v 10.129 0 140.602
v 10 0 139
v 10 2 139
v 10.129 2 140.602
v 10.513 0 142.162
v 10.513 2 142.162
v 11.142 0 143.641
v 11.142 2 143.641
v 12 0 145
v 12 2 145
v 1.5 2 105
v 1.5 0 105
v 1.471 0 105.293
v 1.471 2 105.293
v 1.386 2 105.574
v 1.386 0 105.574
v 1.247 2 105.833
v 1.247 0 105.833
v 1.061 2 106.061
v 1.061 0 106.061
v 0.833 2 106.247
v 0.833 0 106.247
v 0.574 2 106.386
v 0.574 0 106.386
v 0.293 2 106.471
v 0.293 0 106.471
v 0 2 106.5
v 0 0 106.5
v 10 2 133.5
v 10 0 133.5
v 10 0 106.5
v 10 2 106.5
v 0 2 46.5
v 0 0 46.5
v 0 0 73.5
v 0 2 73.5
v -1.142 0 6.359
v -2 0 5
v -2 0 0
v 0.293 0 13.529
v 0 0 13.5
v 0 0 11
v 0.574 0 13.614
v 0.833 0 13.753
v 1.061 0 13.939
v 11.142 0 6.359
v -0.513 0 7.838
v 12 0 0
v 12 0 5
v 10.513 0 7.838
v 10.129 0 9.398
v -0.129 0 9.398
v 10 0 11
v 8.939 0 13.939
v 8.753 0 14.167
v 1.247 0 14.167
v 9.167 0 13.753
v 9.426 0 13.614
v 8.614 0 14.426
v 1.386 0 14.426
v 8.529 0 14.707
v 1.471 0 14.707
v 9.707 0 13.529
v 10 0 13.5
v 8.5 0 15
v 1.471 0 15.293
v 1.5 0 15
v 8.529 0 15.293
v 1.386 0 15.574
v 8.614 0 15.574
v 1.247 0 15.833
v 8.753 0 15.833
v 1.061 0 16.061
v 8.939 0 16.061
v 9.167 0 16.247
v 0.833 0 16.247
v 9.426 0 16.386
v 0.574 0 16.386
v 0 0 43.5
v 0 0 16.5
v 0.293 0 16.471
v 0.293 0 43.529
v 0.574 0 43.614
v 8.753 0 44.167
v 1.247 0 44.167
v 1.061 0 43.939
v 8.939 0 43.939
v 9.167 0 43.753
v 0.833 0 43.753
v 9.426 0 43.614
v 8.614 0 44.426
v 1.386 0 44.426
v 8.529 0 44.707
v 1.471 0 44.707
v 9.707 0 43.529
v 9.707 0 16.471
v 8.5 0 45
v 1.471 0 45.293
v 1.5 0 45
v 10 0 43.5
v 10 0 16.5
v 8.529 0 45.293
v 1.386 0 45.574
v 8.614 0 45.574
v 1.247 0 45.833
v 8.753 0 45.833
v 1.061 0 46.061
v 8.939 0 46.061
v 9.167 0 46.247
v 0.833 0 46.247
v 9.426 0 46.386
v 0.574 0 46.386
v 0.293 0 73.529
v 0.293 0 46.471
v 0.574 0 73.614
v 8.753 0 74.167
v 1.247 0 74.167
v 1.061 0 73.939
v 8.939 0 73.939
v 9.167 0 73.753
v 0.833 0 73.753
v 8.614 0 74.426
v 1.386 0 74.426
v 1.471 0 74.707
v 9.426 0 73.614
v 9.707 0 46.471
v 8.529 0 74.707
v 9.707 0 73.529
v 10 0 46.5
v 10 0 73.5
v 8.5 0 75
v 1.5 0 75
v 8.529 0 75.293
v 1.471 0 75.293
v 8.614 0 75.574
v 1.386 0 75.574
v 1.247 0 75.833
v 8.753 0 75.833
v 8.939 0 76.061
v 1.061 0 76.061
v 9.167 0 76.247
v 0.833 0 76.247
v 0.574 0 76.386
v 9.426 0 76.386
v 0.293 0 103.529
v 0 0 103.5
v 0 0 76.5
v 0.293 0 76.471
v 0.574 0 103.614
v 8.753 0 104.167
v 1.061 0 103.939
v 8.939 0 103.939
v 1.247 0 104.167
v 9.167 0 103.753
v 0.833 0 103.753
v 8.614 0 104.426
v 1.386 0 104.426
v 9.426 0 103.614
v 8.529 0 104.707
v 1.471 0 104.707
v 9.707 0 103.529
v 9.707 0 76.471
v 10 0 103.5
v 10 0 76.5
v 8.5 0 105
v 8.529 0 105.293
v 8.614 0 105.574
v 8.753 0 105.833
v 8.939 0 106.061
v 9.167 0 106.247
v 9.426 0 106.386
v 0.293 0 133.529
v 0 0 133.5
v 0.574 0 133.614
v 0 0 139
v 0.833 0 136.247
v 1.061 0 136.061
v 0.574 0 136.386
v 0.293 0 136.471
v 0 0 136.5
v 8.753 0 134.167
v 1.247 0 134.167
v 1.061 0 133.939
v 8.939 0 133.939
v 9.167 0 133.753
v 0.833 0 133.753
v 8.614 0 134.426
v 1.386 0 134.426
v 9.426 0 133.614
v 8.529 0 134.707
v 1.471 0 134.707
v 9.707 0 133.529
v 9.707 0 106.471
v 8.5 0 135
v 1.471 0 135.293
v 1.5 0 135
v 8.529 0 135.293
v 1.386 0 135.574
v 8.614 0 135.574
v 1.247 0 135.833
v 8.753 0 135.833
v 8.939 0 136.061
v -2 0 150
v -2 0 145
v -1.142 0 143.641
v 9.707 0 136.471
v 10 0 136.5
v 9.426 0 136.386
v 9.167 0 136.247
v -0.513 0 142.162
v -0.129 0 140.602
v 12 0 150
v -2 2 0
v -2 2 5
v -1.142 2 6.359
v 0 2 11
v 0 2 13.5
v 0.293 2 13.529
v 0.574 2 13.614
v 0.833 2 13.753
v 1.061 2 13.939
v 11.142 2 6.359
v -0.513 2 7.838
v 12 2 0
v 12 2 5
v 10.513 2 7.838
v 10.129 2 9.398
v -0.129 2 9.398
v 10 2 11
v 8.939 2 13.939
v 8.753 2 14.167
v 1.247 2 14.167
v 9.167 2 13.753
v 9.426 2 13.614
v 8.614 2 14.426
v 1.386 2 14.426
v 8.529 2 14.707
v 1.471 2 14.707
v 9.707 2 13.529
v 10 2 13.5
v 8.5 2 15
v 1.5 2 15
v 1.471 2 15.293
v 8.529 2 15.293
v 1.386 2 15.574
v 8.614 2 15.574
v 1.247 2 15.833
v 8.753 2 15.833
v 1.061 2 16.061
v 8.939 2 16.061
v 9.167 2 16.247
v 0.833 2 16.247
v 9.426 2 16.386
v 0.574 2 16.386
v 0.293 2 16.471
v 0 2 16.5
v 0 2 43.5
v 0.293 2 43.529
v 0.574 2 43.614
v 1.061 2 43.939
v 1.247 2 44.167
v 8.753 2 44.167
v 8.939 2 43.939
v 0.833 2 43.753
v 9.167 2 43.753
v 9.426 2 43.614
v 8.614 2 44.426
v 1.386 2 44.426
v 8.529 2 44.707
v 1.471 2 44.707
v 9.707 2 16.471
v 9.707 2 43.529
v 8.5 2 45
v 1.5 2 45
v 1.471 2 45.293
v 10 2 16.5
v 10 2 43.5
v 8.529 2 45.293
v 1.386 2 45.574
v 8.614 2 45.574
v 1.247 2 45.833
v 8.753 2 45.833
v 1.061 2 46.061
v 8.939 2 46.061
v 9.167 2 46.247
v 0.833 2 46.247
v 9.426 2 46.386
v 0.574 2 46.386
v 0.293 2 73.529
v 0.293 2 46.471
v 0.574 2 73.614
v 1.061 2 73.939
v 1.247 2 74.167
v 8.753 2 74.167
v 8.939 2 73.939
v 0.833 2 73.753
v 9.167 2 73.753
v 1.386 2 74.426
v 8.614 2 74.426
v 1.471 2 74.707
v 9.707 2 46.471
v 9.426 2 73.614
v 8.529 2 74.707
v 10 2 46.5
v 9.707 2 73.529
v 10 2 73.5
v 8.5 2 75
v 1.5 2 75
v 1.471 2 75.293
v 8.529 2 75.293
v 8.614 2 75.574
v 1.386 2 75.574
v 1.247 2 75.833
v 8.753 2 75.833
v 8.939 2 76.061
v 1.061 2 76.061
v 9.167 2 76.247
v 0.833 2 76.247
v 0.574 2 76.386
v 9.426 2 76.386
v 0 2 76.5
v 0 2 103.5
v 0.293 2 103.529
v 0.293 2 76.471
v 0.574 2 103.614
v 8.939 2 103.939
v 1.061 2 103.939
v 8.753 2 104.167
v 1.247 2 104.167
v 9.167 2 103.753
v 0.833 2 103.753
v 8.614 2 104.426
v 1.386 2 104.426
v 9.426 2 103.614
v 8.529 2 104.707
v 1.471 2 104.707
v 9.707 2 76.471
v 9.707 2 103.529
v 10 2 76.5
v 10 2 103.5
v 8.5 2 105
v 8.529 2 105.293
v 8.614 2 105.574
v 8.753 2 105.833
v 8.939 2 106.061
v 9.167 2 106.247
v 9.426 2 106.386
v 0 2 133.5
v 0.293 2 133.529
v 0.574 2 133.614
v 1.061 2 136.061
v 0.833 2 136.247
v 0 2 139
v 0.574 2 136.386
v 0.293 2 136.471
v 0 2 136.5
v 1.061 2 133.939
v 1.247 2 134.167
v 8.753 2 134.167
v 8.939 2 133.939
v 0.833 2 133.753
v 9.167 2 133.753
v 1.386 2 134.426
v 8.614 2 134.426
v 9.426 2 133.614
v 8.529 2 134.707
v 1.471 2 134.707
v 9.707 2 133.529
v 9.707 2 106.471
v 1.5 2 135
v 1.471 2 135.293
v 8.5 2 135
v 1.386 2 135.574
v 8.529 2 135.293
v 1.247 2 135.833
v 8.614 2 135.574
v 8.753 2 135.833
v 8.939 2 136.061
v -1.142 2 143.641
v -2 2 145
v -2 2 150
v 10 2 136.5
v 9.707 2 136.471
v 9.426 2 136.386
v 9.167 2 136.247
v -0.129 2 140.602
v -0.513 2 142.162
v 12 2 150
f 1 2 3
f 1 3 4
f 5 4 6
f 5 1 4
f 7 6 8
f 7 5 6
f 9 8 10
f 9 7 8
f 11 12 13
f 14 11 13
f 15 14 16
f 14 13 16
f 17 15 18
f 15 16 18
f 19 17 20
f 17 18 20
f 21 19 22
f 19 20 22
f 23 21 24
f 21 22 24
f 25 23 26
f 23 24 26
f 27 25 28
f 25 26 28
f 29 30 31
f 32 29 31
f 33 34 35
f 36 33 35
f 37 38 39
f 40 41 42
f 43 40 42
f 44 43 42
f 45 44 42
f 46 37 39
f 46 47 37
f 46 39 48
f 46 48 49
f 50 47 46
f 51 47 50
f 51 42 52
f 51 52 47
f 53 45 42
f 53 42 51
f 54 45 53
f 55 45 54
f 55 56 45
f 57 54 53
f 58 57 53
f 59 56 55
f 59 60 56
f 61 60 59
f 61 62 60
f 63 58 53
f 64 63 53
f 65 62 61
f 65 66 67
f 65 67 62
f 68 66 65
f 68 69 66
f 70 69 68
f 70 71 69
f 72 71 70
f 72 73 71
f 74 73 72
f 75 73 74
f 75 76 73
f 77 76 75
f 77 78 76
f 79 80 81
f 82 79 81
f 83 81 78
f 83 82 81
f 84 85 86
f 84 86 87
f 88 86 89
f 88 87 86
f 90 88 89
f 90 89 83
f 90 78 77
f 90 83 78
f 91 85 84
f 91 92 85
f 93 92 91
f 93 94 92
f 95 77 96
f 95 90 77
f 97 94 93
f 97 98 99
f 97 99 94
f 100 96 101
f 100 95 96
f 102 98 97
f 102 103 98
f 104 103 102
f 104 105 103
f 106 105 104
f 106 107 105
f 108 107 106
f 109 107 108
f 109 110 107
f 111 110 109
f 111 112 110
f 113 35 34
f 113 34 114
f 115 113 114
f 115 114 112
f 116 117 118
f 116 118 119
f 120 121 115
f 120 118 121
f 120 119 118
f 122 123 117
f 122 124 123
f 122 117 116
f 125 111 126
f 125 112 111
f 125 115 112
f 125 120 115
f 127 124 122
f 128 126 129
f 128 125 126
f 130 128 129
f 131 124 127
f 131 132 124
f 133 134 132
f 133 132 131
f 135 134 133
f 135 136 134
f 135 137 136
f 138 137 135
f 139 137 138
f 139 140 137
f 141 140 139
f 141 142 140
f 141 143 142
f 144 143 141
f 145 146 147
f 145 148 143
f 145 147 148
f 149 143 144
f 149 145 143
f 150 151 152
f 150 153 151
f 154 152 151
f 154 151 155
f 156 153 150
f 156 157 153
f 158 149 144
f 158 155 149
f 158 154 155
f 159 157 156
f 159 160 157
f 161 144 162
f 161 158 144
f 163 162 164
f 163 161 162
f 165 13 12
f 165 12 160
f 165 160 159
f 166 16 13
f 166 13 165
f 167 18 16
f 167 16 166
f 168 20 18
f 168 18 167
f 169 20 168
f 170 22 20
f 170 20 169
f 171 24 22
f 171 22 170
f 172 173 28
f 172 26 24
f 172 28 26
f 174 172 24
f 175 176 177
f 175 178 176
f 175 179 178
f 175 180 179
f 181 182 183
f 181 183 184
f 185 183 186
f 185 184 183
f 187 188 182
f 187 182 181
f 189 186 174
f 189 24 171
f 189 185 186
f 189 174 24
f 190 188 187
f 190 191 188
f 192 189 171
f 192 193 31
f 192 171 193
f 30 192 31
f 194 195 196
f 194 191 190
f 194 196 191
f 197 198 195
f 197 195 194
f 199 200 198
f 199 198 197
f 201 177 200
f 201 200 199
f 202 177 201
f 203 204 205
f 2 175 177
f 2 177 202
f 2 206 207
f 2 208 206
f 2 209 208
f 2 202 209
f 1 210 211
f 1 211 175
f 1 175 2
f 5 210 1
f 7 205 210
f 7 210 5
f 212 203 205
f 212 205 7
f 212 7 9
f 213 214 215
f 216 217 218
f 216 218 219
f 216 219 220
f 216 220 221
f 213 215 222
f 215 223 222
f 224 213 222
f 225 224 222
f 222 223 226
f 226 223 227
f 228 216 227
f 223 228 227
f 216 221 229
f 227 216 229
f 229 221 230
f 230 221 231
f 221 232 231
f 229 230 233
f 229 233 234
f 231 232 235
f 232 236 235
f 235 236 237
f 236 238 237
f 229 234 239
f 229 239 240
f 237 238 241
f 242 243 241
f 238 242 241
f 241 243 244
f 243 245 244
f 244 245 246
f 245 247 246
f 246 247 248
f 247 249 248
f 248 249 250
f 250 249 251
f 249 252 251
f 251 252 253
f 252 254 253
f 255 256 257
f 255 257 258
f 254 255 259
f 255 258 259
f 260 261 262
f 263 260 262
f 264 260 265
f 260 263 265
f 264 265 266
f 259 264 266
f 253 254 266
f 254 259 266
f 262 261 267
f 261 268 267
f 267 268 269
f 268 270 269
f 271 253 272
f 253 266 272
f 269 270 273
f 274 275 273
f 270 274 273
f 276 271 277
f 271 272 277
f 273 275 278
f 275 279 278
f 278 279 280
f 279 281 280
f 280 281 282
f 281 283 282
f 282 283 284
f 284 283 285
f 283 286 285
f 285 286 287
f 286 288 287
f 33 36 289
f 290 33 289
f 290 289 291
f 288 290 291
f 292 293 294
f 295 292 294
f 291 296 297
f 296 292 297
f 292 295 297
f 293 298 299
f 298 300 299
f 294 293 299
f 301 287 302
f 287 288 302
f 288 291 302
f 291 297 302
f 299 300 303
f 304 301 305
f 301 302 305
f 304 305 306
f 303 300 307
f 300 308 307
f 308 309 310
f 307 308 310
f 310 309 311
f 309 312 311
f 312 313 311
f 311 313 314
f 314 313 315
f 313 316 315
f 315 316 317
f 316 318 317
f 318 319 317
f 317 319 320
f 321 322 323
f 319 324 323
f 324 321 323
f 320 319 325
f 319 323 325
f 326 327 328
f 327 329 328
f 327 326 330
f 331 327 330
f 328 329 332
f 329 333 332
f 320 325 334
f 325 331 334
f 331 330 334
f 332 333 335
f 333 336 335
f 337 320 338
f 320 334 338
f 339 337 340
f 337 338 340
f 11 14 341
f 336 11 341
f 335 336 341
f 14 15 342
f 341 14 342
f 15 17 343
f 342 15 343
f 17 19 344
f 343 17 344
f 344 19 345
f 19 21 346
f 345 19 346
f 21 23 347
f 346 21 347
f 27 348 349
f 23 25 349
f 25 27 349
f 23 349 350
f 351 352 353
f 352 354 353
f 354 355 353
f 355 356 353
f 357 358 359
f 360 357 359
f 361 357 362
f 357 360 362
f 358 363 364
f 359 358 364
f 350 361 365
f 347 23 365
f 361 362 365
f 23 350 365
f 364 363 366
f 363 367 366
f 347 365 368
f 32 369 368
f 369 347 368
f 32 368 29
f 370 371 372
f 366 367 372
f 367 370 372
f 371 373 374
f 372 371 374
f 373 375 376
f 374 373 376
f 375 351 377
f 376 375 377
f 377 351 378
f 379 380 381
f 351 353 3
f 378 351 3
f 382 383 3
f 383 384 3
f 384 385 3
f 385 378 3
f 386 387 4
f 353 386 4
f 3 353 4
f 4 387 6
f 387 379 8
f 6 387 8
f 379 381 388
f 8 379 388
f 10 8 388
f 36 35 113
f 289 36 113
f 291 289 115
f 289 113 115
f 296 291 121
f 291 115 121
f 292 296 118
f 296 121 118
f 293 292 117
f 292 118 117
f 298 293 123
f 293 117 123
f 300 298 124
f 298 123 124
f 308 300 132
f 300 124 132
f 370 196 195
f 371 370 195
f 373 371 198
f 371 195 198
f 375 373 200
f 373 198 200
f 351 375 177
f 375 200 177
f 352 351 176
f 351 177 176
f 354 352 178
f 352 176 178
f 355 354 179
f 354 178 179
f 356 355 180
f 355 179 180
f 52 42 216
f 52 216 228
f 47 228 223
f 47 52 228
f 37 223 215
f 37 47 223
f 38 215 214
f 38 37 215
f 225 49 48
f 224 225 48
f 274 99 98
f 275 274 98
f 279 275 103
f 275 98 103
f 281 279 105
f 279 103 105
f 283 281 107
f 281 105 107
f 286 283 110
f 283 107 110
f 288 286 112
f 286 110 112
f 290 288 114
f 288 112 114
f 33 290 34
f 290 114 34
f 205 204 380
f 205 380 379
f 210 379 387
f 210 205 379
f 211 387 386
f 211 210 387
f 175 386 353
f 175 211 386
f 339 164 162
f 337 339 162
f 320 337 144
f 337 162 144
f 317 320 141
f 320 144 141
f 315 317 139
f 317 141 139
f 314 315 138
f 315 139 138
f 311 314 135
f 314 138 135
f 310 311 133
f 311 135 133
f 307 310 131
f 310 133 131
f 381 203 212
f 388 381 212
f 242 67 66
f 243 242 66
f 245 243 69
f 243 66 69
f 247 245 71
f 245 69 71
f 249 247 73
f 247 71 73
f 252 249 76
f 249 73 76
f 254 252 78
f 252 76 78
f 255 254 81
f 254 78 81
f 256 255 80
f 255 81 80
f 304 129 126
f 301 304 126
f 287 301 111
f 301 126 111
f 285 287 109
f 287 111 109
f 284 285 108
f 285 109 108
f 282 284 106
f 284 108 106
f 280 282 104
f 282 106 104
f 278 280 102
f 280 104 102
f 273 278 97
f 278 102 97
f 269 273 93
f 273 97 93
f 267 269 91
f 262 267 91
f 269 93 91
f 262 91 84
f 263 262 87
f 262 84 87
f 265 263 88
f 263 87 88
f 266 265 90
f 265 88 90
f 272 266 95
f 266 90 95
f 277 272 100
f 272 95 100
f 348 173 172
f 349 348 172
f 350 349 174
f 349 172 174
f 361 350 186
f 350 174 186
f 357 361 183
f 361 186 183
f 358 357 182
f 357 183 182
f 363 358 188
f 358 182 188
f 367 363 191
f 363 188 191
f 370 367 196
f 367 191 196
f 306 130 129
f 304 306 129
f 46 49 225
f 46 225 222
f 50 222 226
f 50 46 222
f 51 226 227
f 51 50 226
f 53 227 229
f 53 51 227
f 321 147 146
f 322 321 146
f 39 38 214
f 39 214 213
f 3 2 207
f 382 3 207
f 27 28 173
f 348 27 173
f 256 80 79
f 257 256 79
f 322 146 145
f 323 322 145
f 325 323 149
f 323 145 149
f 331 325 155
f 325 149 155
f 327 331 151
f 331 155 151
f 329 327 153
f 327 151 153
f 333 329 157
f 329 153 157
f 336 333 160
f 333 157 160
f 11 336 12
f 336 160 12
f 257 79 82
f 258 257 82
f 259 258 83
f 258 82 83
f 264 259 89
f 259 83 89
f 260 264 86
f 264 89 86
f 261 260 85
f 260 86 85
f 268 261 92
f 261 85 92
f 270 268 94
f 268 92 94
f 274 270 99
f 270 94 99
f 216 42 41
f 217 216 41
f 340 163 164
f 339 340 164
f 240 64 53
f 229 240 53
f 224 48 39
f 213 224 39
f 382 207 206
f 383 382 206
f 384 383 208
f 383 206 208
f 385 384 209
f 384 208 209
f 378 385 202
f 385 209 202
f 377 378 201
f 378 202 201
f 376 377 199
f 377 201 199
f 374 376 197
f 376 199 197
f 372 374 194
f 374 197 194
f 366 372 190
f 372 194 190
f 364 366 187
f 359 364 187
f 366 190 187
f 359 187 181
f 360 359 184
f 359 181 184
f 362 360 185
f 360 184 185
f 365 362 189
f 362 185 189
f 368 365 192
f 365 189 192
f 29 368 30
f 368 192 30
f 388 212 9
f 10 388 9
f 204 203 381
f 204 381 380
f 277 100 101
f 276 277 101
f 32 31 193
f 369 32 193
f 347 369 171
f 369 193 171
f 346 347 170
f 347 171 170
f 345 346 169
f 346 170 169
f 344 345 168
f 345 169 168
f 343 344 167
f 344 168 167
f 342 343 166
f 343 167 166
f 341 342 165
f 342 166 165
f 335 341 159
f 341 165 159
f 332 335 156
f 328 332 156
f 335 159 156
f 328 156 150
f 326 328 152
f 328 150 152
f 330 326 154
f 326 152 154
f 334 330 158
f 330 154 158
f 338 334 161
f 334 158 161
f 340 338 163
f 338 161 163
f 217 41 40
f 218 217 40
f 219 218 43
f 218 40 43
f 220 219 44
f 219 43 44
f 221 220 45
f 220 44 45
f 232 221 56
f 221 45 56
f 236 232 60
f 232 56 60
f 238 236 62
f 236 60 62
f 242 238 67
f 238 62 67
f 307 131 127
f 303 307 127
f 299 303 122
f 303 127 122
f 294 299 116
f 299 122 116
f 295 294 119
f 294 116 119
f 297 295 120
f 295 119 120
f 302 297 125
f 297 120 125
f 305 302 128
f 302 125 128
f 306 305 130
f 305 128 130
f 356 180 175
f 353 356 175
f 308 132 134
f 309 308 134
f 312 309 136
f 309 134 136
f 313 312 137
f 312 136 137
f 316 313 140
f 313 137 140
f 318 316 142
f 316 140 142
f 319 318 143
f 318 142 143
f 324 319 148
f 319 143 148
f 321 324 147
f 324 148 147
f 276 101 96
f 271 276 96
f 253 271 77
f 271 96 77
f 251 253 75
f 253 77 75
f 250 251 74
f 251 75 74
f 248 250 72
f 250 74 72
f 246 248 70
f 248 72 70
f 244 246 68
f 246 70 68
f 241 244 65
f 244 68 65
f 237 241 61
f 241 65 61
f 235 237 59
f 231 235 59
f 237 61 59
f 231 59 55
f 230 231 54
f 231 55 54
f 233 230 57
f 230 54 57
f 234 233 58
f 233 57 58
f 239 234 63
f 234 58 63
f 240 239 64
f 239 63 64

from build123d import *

# Parameters (mm, degrees)
SKETCH_1_W      = 2
SKETCH_1_H      = 5
EXTRUDE_1_DEPTH = 2
FILLET_1_R      = 10


with BuildPart() as part:
    # 草图1 → 凸台-拉伸1 (new body)
    with BuildSketch(Plane(origin=(0, 0, 0), x_dir=(1, 0, 0), z_dir=(0, 1, 0))):
        with BuildLine():
            Line((10, 0), (0, 0))
            Line((0, 0), (0, -5))
            Line((0, -5), (0, -13.5))
            ThreePointArc((0, -13.5), (1.060660172, -13.939339828), (1.5, -15))
            ThreePointArc((1.5, -15), (1.060660172, -16.060660172), (0, -16.5))
            Line((0, -16.5), (0, -43.5))
            ThreePointArc((0, -43.5), (1.060660172, -43.939339828), (1.5, -45))
            ThreePointArc((1.5, -45), (1.060660172, -46.060660172), (0, -46.5))
            Line((0, -46.5), (0, -73.5))
            ThreePointArc((0, -73.5), (1.060660172, -73.939339828), (1.5, -75))
            Line((1.5, -75), (2.5, -75))
            Line((2.5, -75), (2.5, -72.5))
            Line((2.5, -72.5), (7.5, -72.5))
            Line((7.5, -72.5), (7.5, -75))
            Line((7.5, -75), (8.5, -75))
            ThreePointArc((8.5, -75), (8.939339828, -73.939339828), (10, -73.5))
            Line((10, -73.5), (10, -46.5))
            ThreePointArc((10, -46.5), (8.5, -45), (10, -43.5))
            Line((10, -43.5), (10, -16.5))
            ThreePointArc((10, -16.5), (8.5, -15), (10, -13.5))
            Line((10, -13.5), (10, -5))
            Line((10, -5), (10, 0))
        make_face()
        Polygon((2.5, -72.5), (2.5, -75), (5, -75), (7.5, -75), (7.5, -72.5), align=None)
        Polygon((5, -75), (2.5, -75), (2.5, -77.5), (7.5, -77.5), (7.5, -75), align=None)
        with BuildLine():
            Line((2.5, -75), (1.5, -75))
            ThreePointArc((1.5, -75), (1.060660172, -76.060660172), (0, -76.5))
            Line((0, -76.5), (0, -103.5))
            ThreePointArc((0, -103.5), (1.060660172, -103.939339828), (1.5, -105))
            ThreePointArc((1.5, -105), (1.060660172, -106.060660172), (0, -106.5))
            Line((0, -106.5), (0, -133.5))
            ThreePointArc((0, -133.5), (1.060660172, -133.939339828), (1.5, -135))
            ThreePointArc((1.5, -135), (1.060660172, -136.060660172), (0, -136.5))
            Line((0, -136.5), (0, -145))
            Line((0, -145), (0, -150))
            Line((0, -150), (10, -150))
            Line((10, -150), (10, -145))
            Line((10, -145), (10, -136.5))
            ThreePointArc((10, -136.5), (8.5, -135), (10, -133.5))
            Line((10, -133.5), (10, -106.5))
            ThreePointArc((10, -106.5), (8.5, -105), (10, -103.5))
            Line((10, -103.5), (10, -76.5))
            ThreePointArc((10, -76.5), (8.939339828, -76.060660172), (8.5, -75))
            Line((8.5, -75), (7.5, -75))
            Line((7.5, -75), (7.5, -77.5))
            Line((7.5, -77.5), (2.5, -77.5))
            Line((2.5, -77.5), (2.5, -75))
        make_face()
        with Locations((11, -147.5)):
            Rectangle(SKETCH_1_W, SKETCH_1_H)
        with Locations((-1, -147.5)):
            Rectangle(SKETCH_1_W, SKETCH_1_H)
        with Locations((11, -2.5)):
            Rectangle(SKETCH_1_W, SKETCH_1_H)
        with Locations((-1, -2.5)):
            Rectangle(SKETCH_1_W, SKETCH_1_H)
    extrude(amount=EXTRUDE_1_DEPTH)

    # 圆角1
    # the kernel refuses this fillet: 10 mm, written as the material it adds along each edge
    with BuildSketch(Plane(origin=(10, 0, 145), x_dir=(0, 0, -1), z_dir=(0, 1, 0)), Plane(origin=(0, 0, 5), x_dir=(0, 0, 1), z_dir=(0, 1, 0))) as fillet_1_piece_1:
        with BuildLine():
            CenterArc((6, -10), FILLET_1_R, 90, 36.869897646)
            Line((0, -2), (0, 0))
            Line((0, 0), (6, 0))
        make_face()
    extrude(amount=2)
    with BuildSketch(Plane(origin=(0, 0, 145), x_dir=(-1, 0, 0), z_dir=(0, 1, 0)), Plane(origin=(10, 0, 5), x_dir=(1, 0, 0), z_dir=(0, 1, 0))) as fillet_1_piece_2:
        with BuildLine():
            CenterArc((10, -6), FILLET_1_R, 143.130102354, 36.869897646)
            Line((0, -6), (0, 0))
            Line((0, 0), (2, 0))
        make_face()
    extrude(amount=2)


solid = part.part
